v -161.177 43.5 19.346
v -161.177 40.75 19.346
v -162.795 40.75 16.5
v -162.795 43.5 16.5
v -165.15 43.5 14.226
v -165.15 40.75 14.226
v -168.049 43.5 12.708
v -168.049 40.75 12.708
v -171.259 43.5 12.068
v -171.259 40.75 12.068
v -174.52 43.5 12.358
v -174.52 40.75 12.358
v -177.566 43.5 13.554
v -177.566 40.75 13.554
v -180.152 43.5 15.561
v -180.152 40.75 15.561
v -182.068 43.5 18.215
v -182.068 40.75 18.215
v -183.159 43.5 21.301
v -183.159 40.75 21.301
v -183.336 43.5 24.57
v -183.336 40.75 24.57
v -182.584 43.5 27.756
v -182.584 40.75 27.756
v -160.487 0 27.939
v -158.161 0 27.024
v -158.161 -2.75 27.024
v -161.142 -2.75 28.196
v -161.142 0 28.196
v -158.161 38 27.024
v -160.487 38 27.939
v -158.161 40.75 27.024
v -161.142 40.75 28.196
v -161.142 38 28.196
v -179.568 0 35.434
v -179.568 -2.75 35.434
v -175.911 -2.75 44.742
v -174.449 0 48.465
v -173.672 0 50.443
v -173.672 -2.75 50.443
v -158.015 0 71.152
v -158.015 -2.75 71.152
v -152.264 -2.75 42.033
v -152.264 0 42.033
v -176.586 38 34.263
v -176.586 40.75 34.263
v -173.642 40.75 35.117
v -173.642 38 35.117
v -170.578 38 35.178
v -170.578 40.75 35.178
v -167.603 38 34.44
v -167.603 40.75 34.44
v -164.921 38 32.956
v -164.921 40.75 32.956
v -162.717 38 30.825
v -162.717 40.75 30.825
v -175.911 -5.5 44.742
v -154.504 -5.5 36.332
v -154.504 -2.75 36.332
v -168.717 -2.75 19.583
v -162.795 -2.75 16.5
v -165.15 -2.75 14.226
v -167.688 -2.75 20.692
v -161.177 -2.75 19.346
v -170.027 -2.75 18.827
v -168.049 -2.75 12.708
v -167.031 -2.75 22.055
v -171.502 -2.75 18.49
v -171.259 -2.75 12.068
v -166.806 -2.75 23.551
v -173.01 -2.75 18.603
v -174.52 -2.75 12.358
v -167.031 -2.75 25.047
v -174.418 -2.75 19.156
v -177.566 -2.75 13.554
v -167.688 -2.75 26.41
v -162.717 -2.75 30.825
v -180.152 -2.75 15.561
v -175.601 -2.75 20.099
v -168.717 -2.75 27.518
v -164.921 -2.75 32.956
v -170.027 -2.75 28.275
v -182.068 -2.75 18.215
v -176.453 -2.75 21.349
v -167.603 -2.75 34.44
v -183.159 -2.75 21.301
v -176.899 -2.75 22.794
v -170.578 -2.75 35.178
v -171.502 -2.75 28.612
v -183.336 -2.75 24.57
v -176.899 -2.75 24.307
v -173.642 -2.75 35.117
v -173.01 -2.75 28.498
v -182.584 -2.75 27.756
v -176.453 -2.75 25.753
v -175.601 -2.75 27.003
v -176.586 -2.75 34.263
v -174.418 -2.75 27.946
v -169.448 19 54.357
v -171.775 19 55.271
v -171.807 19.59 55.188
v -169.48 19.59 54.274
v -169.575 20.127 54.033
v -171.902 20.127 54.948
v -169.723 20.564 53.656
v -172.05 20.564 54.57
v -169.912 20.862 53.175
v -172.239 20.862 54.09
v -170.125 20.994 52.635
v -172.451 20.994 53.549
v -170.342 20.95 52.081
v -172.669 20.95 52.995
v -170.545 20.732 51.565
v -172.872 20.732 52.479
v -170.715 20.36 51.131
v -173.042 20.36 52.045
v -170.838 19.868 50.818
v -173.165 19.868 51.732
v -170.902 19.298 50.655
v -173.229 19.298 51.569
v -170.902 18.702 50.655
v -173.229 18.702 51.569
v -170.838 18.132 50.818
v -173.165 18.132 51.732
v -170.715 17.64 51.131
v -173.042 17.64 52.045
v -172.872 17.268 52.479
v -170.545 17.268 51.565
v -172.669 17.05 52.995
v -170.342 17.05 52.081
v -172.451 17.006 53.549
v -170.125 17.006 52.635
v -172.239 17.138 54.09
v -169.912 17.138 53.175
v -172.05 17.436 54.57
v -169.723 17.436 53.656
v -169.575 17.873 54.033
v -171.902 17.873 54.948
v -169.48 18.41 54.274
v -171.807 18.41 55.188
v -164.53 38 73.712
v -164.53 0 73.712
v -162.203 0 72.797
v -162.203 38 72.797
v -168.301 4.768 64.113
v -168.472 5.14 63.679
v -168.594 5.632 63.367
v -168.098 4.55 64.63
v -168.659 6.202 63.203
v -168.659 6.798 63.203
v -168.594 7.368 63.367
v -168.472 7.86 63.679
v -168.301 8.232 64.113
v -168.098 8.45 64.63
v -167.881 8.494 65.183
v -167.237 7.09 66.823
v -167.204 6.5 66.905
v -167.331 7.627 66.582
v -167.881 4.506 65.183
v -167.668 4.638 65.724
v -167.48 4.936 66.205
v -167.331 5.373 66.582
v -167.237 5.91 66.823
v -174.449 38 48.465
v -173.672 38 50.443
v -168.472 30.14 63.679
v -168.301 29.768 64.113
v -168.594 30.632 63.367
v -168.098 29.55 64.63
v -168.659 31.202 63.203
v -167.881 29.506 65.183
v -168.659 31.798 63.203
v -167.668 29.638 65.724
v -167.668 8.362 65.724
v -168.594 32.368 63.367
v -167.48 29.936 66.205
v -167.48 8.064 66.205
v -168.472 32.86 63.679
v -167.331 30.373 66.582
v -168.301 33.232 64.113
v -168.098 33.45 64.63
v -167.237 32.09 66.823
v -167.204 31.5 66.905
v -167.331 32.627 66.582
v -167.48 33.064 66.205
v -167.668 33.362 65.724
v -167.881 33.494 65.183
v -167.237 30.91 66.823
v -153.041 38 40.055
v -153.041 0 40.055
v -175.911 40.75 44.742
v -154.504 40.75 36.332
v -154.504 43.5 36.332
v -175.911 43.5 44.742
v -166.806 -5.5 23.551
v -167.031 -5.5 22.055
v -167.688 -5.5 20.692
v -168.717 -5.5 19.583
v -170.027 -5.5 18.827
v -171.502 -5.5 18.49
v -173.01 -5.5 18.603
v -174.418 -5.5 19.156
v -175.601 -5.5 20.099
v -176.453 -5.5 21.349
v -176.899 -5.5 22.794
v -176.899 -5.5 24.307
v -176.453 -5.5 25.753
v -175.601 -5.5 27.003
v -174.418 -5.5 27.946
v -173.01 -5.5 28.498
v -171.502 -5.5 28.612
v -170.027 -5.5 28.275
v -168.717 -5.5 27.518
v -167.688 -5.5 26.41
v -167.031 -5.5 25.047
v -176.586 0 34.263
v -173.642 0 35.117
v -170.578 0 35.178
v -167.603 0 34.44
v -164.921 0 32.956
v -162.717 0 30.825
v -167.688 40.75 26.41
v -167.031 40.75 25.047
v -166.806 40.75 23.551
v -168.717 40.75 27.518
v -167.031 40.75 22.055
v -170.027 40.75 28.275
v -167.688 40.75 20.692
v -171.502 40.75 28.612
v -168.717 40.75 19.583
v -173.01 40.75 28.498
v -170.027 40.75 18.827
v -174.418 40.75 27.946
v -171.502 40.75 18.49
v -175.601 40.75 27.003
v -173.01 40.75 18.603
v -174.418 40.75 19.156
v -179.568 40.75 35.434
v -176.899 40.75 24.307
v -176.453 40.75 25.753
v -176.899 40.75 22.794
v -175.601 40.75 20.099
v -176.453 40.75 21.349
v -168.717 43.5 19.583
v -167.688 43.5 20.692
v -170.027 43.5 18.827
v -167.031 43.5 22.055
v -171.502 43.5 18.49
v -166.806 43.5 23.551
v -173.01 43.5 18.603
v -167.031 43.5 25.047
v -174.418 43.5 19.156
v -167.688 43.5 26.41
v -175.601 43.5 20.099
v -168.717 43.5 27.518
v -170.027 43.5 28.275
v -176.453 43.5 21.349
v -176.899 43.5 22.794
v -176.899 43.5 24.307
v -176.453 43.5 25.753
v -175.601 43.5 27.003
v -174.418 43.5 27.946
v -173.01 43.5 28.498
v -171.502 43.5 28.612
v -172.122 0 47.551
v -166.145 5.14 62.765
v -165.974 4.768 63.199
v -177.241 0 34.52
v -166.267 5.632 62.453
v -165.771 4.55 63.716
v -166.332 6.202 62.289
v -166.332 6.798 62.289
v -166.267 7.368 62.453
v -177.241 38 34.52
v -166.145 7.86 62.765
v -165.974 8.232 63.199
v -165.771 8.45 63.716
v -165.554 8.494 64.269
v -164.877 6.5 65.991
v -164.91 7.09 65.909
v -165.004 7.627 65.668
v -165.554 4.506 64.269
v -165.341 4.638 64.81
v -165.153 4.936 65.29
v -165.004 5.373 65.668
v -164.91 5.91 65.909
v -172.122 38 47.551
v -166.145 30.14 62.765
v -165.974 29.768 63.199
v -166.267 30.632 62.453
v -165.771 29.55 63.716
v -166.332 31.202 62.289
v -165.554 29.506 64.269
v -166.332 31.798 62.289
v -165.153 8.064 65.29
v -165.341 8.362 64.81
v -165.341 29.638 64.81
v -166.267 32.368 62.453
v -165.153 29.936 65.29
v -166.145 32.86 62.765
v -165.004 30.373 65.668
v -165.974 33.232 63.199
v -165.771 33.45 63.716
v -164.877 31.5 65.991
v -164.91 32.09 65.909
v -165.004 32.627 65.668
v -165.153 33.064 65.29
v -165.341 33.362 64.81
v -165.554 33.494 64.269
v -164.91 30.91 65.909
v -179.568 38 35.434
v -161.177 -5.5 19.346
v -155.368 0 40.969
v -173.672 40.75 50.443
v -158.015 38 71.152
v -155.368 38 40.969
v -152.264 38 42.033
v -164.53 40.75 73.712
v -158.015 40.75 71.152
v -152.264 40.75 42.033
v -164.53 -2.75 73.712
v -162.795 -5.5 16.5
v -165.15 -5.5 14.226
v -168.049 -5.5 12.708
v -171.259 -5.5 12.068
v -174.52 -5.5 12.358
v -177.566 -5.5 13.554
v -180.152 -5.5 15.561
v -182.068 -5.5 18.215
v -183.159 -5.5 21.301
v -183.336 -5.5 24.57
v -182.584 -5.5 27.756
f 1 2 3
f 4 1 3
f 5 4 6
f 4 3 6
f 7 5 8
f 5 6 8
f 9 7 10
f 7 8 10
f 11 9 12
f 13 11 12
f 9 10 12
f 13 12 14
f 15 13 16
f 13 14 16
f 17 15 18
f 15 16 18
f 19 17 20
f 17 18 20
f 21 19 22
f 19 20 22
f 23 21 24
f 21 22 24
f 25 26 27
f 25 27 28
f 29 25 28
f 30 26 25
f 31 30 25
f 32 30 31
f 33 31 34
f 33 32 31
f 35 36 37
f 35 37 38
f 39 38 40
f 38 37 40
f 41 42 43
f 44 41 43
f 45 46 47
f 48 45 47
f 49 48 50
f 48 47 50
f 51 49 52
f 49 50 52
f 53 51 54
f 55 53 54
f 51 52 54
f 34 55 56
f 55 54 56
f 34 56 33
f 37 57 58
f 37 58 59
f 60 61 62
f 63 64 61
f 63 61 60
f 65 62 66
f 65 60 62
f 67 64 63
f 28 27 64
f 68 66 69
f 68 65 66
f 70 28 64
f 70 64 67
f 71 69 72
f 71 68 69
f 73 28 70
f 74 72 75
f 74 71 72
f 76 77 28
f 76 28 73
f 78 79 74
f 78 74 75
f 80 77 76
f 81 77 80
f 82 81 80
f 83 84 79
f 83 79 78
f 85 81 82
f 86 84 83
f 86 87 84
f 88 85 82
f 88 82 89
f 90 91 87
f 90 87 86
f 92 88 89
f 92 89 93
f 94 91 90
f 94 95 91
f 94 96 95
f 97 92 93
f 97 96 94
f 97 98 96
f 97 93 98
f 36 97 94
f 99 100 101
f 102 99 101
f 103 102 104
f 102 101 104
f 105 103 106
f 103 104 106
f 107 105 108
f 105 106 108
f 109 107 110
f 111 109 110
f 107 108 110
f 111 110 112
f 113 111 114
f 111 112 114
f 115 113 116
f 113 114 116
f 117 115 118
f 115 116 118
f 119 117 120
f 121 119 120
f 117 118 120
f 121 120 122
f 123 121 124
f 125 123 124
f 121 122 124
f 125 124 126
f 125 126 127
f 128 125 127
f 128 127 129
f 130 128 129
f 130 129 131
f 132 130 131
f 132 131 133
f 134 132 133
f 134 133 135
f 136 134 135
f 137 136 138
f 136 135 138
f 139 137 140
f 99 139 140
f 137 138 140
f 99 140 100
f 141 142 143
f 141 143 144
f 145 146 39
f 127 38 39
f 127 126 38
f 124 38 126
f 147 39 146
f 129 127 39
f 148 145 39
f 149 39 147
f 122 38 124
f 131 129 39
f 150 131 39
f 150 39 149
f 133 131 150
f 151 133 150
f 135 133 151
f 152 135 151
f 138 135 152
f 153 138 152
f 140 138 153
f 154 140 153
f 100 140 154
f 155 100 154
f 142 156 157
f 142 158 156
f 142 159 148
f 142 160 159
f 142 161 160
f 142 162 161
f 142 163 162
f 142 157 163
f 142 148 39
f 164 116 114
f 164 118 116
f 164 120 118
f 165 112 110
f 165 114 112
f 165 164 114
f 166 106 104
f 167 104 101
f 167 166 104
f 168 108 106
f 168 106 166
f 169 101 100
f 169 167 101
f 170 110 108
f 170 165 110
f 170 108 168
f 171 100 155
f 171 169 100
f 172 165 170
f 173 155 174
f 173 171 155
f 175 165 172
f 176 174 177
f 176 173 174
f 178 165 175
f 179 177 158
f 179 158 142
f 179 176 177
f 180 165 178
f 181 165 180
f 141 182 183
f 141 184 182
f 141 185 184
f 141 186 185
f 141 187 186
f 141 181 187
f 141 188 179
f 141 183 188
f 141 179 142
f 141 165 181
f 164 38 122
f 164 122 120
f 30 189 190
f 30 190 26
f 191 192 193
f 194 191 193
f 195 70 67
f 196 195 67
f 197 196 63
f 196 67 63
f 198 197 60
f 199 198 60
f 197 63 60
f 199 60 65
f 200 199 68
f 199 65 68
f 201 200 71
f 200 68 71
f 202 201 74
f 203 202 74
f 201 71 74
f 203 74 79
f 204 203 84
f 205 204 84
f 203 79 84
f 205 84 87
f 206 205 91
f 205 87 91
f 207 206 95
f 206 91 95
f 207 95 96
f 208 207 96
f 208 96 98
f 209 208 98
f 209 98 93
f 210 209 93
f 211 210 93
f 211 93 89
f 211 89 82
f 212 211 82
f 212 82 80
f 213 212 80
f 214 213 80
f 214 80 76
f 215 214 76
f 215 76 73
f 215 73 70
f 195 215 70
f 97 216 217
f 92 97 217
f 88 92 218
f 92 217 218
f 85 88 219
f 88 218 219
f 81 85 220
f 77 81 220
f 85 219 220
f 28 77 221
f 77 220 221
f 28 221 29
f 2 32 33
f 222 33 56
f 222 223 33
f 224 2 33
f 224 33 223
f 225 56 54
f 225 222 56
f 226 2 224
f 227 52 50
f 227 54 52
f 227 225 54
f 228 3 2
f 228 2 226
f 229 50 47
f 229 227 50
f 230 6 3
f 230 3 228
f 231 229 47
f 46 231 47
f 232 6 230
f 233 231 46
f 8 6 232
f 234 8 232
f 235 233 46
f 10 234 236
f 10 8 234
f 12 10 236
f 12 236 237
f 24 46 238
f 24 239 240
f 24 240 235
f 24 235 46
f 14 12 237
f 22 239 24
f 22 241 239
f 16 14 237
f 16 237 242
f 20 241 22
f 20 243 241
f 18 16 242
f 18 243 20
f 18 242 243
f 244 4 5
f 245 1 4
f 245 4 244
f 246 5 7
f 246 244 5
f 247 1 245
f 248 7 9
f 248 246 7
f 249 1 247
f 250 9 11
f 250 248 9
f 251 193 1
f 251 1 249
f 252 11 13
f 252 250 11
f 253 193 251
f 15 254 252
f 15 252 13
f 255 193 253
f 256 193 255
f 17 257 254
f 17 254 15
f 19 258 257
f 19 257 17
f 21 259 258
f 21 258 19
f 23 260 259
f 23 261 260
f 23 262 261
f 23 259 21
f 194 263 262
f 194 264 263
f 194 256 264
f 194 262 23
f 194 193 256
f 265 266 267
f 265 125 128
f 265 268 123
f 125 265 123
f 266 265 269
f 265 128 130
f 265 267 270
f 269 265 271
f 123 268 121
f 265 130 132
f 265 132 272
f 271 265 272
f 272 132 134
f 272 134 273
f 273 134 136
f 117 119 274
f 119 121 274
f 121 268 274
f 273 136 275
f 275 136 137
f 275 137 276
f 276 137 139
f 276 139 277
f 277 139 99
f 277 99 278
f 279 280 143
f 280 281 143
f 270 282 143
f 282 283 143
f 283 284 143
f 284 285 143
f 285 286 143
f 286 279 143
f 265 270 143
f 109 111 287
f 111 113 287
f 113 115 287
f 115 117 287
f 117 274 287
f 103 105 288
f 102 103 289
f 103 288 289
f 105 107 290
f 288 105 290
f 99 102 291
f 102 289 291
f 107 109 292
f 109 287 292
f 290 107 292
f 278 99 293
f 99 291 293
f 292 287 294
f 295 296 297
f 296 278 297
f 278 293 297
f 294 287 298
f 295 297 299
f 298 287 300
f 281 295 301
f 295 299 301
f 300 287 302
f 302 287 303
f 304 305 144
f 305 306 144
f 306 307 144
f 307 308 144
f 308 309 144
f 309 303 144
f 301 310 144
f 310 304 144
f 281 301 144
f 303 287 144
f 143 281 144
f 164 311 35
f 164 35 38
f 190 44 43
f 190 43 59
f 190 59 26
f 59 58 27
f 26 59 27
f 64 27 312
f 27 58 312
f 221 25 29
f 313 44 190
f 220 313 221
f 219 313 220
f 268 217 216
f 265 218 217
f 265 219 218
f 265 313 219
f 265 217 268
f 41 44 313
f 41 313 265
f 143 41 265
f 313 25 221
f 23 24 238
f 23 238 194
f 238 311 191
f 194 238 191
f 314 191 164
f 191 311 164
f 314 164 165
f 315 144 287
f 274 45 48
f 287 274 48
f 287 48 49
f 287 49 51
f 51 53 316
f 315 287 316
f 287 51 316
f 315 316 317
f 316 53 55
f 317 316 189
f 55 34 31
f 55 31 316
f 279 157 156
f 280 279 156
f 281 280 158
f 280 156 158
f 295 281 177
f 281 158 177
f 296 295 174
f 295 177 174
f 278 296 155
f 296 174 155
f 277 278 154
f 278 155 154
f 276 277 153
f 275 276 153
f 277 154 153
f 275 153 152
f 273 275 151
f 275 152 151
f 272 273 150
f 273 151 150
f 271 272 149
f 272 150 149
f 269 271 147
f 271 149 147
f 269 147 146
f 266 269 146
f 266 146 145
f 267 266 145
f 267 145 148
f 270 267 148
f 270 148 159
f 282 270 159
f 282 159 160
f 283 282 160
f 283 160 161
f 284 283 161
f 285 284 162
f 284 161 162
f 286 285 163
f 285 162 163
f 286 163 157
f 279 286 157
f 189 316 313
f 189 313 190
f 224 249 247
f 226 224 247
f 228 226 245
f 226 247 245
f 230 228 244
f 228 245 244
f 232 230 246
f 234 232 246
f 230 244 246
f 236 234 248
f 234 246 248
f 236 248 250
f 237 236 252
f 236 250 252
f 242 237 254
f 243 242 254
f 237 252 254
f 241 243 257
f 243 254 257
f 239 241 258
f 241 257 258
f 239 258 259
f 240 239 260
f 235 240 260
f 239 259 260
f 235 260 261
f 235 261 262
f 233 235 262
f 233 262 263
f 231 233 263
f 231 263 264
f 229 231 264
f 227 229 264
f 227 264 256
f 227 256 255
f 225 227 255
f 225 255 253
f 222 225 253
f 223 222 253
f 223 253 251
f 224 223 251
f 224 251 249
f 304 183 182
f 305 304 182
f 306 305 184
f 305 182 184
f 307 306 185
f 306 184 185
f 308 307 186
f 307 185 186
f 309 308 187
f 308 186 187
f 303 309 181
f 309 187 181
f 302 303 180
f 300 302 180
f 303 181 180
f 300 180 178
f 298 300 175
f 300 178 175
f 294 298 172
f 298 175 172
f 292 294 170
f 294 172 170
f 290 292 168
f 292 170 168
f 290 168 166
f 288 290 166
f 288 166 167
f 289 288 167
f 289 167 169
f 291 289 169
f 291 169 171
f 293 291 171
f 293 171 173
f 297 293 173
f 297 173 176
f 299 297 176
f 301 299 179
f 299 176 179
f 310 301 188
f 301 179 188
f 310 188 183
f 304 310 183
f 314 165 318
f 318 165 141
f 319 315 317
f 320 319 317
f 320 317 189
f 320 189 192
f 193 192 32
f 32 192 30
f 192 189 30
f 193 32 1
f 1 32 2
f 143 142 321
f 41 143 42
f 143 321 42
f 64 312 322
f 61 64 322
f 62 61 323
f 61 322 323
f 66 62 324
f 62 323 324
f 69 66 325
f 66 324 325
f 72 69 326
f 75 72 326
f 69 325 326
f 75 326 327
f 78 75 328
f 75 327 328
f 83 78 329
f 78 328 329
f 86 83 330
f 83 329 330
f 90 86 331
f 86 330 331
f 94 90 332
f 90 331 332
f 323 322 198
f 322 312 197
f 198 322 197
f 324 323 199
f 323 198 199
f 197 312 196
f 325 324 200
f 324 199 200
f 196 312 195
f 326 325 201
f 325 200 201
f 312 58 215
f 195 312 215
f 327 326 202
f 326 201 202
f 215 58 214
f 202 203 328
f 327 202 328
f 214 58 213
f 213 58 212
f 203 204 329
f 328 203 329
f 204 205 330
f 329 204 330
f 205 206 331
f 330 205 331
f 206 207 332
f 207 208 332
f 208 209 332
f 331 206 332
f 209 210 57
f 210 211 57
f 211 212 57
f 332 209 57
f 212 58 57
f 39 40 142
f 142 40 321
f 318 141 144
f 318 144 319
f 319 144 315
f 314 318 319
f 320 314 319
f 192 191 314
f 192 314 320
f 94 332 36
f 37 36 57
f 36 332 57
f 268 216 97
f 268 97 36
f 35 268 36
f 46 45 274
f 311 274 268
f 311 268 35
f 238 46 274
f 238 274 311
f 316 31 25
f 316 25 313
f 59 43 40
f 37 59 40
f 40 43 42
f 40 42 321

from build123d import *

# Parameters (mm, degrees)
SALIENTE_EXTRUIR1_START   = -2.75
SALIENTE_EXTRUIR1_DEPTH   = 5.5
SALIENTE_EXTRUIR1_2_DEPTH = 2.75
SALIENTE_EXTRUIR2_DEPTH   = 38
SALIENTE_EXTRUIR3_START   = 2.75
SALIENTE_EXTRUIR3_DEPTH   = 2.75
CROQUIS4_W                = 23
CROQUIS4_H                = 43.5
CORTAR_EXTRUIR1_DEPTH     = 8.25
CORTAR_EXTRUIR2_DEPTH     = 2.75
CROQUIS6_W                = 38
CROQUIS6_H                = 22.249999999
CORTAR_EXTRUIR3_DEPTH     = 16.59246817
CROQUIS7_W                = 3.203765914
CROQUIS7_H                = 38
CORTAR_EXTRUIR4_DEPTH     = 8.25
CROQUIS8_W                = 3.203765916
CROQUIS8_H                = 38
CORTAR_EXTRUIR5_DEPTH     = 8.25
CROQUIS9_W                = 14
CROQUIS9_H                = 38
CORTAR_EXTRUIR6_DEPTH     = 0.703765915
CROQUIS10_W               = 14
CROQUIS10_H               = 38
CORTAR_EXTRUIR7_DEPTH     = 0.703765915
SALIENTE_EXTRUIR4_START   = 2.75
SALIENTE_EXTRUIR4_DEPTH   = 2.75
CORTAR_EXTRUIR8_DEPTH     = 2.75
CROQUIS13_W               = 12.249999999
CROQUIS13_H               = 2.75
CORTAR_EXTRUIR9_DEPTH     = 74.034358614
CROQUIS14_W               = 12.249999999
CROQUIS14_H               = 2.75
CORTAR_EXTRUIR10_DEPTH    = 74.034358614
CROQUIS15_W               = 5
CROQUIS15_H               = 2.75
CROQUIS16_W               = 5
CROQUIS16_H               = 2.75
TALADRO1_D                = 10.15
TALADRO1_DEPTH            = 2.75
TALADRO2_D                = 10.15
CORTAR_EXTRUIR11_REACH    = 202.135
SALIENTE_EXTRUIR5_DEPTH   = 2.75
SALIENTE_EXTRUIR6_START   = -2.75
SALIENTE_EXTRUIR6_DEPTH   = 2.75
CROQUIS24_W               = 27.125
CROQUIS24_H               = 38
SALIENTE_EXTRUIR7_DEPTH   = 2.5
CROQUIS25_R               = 2
CORTAR_EXTRUIR12_DEPTH    = 2.5


with BuildPart() as part:
    # Saliente-Extruir1: read off the stored shape, not the designer's step
    # Saliente-Extruir1 outline → Saliente-Extruir1 (new body)
    with BuildSketch(Plane(origin=(0, 40.75, 0), x_dir=(-1, 0, 0), z_dir=(0, 1, 0)).offset(SALIENTE_EXTRUIR1_START)):
        with BuildLine():
            Line((161.177139208, 19.345694485), (182.584423689, 27.755698719))
            Line((182.584423689, 27.755698719), (171.432026769, 56.143619441))
            ThreePointArc((171.432026769, 56.143619441), (156.523382412, 62.642259564), (150.024742289, 47.733615207))
            Line((150.024742289, 47.733615207), (161.177139208, 19.345694485))
        make_face()
    extrude(amount=SALIENTE_EXTRUIR1_DEPTH)

    # Saliente-Extruir1 2 outline → Saliente-Extruir1 2 (add)
    with BuildSketch(Plane(origin=(0, 40.75, 0), x_dir=(-1, 0, 0), z_dir=(0, 1, 0))):
        with BuildLine():
            ThreePointArc((161.177139208, 19.345694485), (176.085783565, 12.847054362), (182.584423687, 27.755698719))
            Line((182.584423687, 27.755698719), (161.177139208, 19.345694485))
        make_face()
    extrude(amount=SALIENTE_EXTRUIR1_2_DEPTH)

    # Croquis2 → Saliente-Extruir2 (add)
    with BuildSketch(Plane.XZ.offset(-38)):
        Polygon((-171.432026768, 56.143619442), (-150.024742288, 47.733615205), (-161.177139209, 19.345694483), (-182.584423689, 27.755698719), align=None)
    extrude(amount=SALIENTE_EXTRUIR2_DEPTH)

    # Croquis3 → Saliente-Extruir3 (add)
    with BuildSketch(Plane.XZ.offset(SALIENTE_EXTRUIR3_START)):
        with BuildLine():
            Line((-182.584423688, 27.755698719), (-171.432026768, 56.143619441))
            ThreePointArc((-171.432026768, 56.143619441), (-156.523382412, 62.642259564), (-150.024742289, 47.733615207))
            Line((-150.024742289, 47.733615207), (-161.177139208, 19.345694485))
            Line((-161.177139208, 19.345694485), (-182.584423688, 27.755698719))
        make_face()
    extrude(amount=-SALIENTE_EXTRUIR3_DEPTH)

    # Croquis4 → Cortar-Extruir1 (cut)
    with BuildSketch(Plane(origin=(-14.965700114, 0, -38.094511116), x_dir=(-0.9307514991056489, 0, 0.3656523580022251), z_dir=(-0.3656523580022251, 0, -0.9307514991056489))):
        with Locations((168.589662745, 19)):
            Rectangle(CROQUIS4_W, CROQUIS4_H)
    extrude(amount=-CORTAR_EXTRUIR1_DEPTH, mode=Mode.SUBTRACT)

    # Croquis5 → Cortar-Extruir2 (cut)
    with BuildSketch(Plane(origin=(0, 40.75, 0), x_dir=(1, 0, 0), z_dir=(0, 1, 0))):
        with BuildLine():
            Line((-161.142417183, -28.195858914), (-176.585881806, -34.262934025))
            ThreePointArc((-176.585881806, -34.262934025), (-167.602648859, -34.440489141), (-161.142417183, -28.195858914))
        make_face()
    extrude(amount=-CORTAR_EXTRUIR2_DEPTH, mode=Mode.SUBTRACT)

    # Croquis6 → Cortar-Extruir3 (cut)
    with BuildSketch(Plane(origin=(-149.193349022, 0, 58.611670162), x_dir=(0, 1, 0), z_dir=(0.9307514991056486, 0, -0.3656523580022258))):
        with Locations((19, -21.553766865)):
            Rectangle(CROQUIS6_W, CROQUIS6_H)
    extrude(amount=-CORTAR_EXTRUIR3_DEPTH, mode=Mode.SUBTRACT)

    # Croquis7 → Cortar-Extruir4 (cut)
    with BuildSketch(Plane(origin=(-3.8133032, 0, -9.706590403), x_dir=(0.9307514990825102, 0, -0.36565235806112356), z_dir=(0.36565235806112356, 0, 0.9307514990825102))):
        with Locations((-158.691545702, 19)):
            Rectangle(CROQUIS7_W, CROQUIS7_H)
    extrude(amount=-CORTAR_EXTRUIR4_DEPTH, mode=Mode.SUBTRACT)

    # Croquis8 → Cortar-Extruir5 (cut)
    with BuildSketch(Plane(origin=(-3.8133032, 0, -9.706590403), x_dir=(0.9307514990825102, 0, -0.36565235806112356), z_dir=(0.36565235806112356, 0, 0.9307514990825102))):
        with Locations((-178.487779787, 19)):
            Rectangle(CROQUIS8_W, CROQUIS8_H)
    extrude(amount=-CORTAR_EXTRUIR5_DEPTH, mode=Mode.SUBTRACT)

    # Croquis9 → Cortar-Extruir6 (cut)
    with BuildSketch(Plane(origin=(-164.636813645, 0, 64.678745273), x_dir=(-0.3656523580022247, 0, -0.930751499105649), z_dir=(0.930751499105649, 1.4355340193330324e-15, -0.3656523580022247))):
        with Locations((25.678766864, 19)):
            Rectangle(CROQUIS9_W, CROQUIS9_H)
    extrude(amount=-CORTAR_EXTRUIR6_DEPTH, mode=Mode.SUBTRACT)

    # Croquis10 → Cortar-Extruir7 (cut)
    with BuildSketch(Plane(origin=(-149.193349022, 0, 58.611670162), x_dir=(0.3656523580022248, 0, 0.930751499105649), z_dir=(-0.930751499105649, -1.4355340193330322e-15, 0.3656523580022248))):
        with Locations((-25.678766864, 19)):
            Rectangle(CROQUIS10_W, CROQUIS10_H)
    extrude(amount=-CORTAR_EXTRUIR7_DEPTH, mode=Mode.SUBTRACT)

    # Croquis11 → Saliente-Extruir4 (add)
    with BuildSketch(Plane.XZ.offset(2.75).offset(SALIENTE_EXTRUIR4_START)):
        with BuildLine():
            Line((-150.024742289, 47.733615207), (-161.177139208, 19.345694485))
            ThreePointArc((-161.177139208, 19.345694485), (-176.085783565, 12.847054362), (-182.584423687, 27.755698719))
            Line((-182.584423687, 27.755698719), (-171.432026769, 56.143619441))
            ThreePointArc((-171.432026769, 56.143619441), (-156.523382412, 62.642259564), (-150.024742289, 47.733615207))
        make_face()
    extrude(amount=-SALIENTE_EXTRUIR4_DEPTH)

    # Croquis12 → Cortar-Extruir8 (cut)
    with BuildSketch(Plane(origin=(0, 0, 0), x_dir=(-1, 0, 0), z_dir=(0, 1, 0))):
        with BuildLine():
            Line((161.142417183, 28.195858914), (176.585881806, 34.262934025))
            ThreePointArc((176.585881806, 34.262934025), (167.602648859, 34.440489141), (161.142417183, 28.195858914))
        make_face()
    extrude(amount=-CORTAR_EXTRUIR8_DEPTH, mode=Mode.SUBTRACT)

    # Croquis13 → Cortar-Extruir9 (cut, through all)
    with BuildSketch(Plane(origin=(-146.211439094, 0, 57.440205601), x_dir=(-0.36565235800222584, 0, -0.9307514991056486), z_dir=(0.9307514991056486, 0, -0.36565235800222584))):
        with Locations((16.553766864, -4.125)):
            Rectangle(CROQUIS13_W, CROQUIS13_H)
    extrude(amount=-CORTAR_EXTRUIR9_DEPTH, mode=Mode.SUBTRACT)

    # Croquis14 → Cortar-Extruir10 (cut, through all)
    with BuildSketch(Plane(origin=(-146.211439094, 0, 57.440205601), x_dir=(-0.36565235800222584, 0, -0.9307514991056486), z_dir=(0.9307514991056486, 0, -0.36565235800222584))):
        with Locations((16.553766864, 42.125)):
            Rectangle(CROQUIS14_W, CROQUIS14_H)
    extrude(amount=-CORTAR_EXTRUIR10_DEPTH, mode=Mode.SUBTRACT)

    # Croquis15 → Revolución1 (revolve)
    with BuildSketch(Plane(origin=(0, 0, 51.938617325), x_dir=(-1, 0, 0), z_dir=(0, 0, -1))):
        with Locations((158.228384529, -4.125)):
            Rectangle(CROQUIS15_W, CROQUIS15_H)
    revolve(axis=Axis((-160.728384529, -5.5, 51.938617325), (0, 1, 0)))

    # Croquis16 → Revolución2 (revolve)
    with BuildSketch(Plane(origin=(0, 0, 51.938617325), x_dir=(-1, 0, 0), z_dir=(0, 0, -1))):
        with Locations((158.228384529, 42.125)):
            Rectangle(CROQUIS16_W, CROQUIS16_H)
    revolve(axis=Axis((-160.728384529, 40.75, 51.938617325), (0, 1, 0)))

    # Taladro1
    with Locations(Plane(origin=(0, -5.5, 0), x_dir=(-1, 0, 0), z_dir=(0, -1, 0))):
        with Locations((171.880781448, -23.550696602)):
            Hole(TALADRO1_D / 2, depth=TALADRO1_DEPTH)

    # Taladro2 (through all)
    with Locations(Plane(origin=(0, 40.75, 0), x_dir=(-1, 0, 0), z_dir=(0, -1, 0))):
        with Locations((171.880781448, -23.550696602)):
            Hole(TALADRO2_D / 2)

    # Cortar-Extruir11: up to this face of the body (flat: up to its plane)
    cortar_extruir11_end = Plane(part.part.faces().sort_by_distance((-169.996704911, 43.5, 28.346528005))[0])
    # Croquis21 → Cortar-Extruir11 (cut, up to the picked face)
    with BuildSketch(Plane.XZ.offset(5.5), mode=Mode.PRIVATE) as cortar_extruir11_sk1:
        Polygon((-173.671647461, 50.44276651), (-152.264362982, 42.032762276), (-144.951315822, 60.647792258), (-166.358600301, 69.057796492), align=None)
    cortar_extruir11_tool1 = split(extrude(cortar_extruir11_sk1.sketch, amount=-CORTAR_EXTRUIR11_REACH, mode=Mode.PRIVATE), bisect_by=cortar_extruir11_end, keep=Keep.BOTH, mode=Mode.PRIVATE)
    add(cortar_extruir11_tool1.solids().sort_by(Axis((-159.311482, -5.5, 55.545279), (0, 1, 0)))[0], mode=Mode.SUBTRACT)

    # Croquis22 → Saliente-Extruir5 (add)
    with BuildSketch(Plane.XZ.offset(2.75)):
        Polygon((-152.264362982, 42.032762276), (-173.671647461, 50.44276651), (-164.530338511, 73.711553987), (-158.015078017, 71.151987481), align=None)
    extrude(amount=-SALIENTE_EXTRUIR5_DEPTH)

    # Croquis23 → Saliente-Extruir6 (add)
    with BuildSketch(Plane(origin=(0, 40.75, 0), x_dir=(1, 0, 0), z_dir=(0, 1, 0)).offset(SALIENTE_EXTRUIR6_START)):
        Polygon((-158.015078017, -71.151987481), (-152.264362982, -42.032762276), (-173.671647461, -50.44276651), (-164.530338511, -73.711553987), align=None)
    extrude(amount=SALIENTE_EXTRUIR6_DEPTH)

    # Croquis24 → Saliente-Extruir7 (add)
    with BuildSketch(Plane(origin=(-167.618723573, 0, 65.850209835), x_dir=(0.36565235800222584, 0, 0.9307514991056486), z_dir=(-0.9307514991056486, 0, 0.36565235800222584))):
        with Locations((-5.116266864, 19)):
            Rectangle(CROQUIS24_W, CROQUIS24_H)
    extrude(amount=-SALIENTE_EXTRUIR7_DEPTH)

    # Croquis25 → Cortar-Extruir12 (cut)
    with BuildSketch(Plane(origin=(-167.618723573, 0, 65.850209835), x_dir=(0.36565235800222584, 0, 0.9307514991056486), z_dir=(-0.9307514991056486, 0, 0.36565235800222584))):
        with Locations((-0.866266864, 6.5)):
            Circle(CROQUIS25_R)
        with Locations((-0.866266864, 31.5)):
            Circle(CROQUIS25_R)
        with Locations((-13.366266864, 19)):
            Circle(CROQUIS25_R)
    extrude(amount=-CORTAR_EXTRUIR12_DEPTH, mode=Mode.SUBTRACT)


solid = part.part
